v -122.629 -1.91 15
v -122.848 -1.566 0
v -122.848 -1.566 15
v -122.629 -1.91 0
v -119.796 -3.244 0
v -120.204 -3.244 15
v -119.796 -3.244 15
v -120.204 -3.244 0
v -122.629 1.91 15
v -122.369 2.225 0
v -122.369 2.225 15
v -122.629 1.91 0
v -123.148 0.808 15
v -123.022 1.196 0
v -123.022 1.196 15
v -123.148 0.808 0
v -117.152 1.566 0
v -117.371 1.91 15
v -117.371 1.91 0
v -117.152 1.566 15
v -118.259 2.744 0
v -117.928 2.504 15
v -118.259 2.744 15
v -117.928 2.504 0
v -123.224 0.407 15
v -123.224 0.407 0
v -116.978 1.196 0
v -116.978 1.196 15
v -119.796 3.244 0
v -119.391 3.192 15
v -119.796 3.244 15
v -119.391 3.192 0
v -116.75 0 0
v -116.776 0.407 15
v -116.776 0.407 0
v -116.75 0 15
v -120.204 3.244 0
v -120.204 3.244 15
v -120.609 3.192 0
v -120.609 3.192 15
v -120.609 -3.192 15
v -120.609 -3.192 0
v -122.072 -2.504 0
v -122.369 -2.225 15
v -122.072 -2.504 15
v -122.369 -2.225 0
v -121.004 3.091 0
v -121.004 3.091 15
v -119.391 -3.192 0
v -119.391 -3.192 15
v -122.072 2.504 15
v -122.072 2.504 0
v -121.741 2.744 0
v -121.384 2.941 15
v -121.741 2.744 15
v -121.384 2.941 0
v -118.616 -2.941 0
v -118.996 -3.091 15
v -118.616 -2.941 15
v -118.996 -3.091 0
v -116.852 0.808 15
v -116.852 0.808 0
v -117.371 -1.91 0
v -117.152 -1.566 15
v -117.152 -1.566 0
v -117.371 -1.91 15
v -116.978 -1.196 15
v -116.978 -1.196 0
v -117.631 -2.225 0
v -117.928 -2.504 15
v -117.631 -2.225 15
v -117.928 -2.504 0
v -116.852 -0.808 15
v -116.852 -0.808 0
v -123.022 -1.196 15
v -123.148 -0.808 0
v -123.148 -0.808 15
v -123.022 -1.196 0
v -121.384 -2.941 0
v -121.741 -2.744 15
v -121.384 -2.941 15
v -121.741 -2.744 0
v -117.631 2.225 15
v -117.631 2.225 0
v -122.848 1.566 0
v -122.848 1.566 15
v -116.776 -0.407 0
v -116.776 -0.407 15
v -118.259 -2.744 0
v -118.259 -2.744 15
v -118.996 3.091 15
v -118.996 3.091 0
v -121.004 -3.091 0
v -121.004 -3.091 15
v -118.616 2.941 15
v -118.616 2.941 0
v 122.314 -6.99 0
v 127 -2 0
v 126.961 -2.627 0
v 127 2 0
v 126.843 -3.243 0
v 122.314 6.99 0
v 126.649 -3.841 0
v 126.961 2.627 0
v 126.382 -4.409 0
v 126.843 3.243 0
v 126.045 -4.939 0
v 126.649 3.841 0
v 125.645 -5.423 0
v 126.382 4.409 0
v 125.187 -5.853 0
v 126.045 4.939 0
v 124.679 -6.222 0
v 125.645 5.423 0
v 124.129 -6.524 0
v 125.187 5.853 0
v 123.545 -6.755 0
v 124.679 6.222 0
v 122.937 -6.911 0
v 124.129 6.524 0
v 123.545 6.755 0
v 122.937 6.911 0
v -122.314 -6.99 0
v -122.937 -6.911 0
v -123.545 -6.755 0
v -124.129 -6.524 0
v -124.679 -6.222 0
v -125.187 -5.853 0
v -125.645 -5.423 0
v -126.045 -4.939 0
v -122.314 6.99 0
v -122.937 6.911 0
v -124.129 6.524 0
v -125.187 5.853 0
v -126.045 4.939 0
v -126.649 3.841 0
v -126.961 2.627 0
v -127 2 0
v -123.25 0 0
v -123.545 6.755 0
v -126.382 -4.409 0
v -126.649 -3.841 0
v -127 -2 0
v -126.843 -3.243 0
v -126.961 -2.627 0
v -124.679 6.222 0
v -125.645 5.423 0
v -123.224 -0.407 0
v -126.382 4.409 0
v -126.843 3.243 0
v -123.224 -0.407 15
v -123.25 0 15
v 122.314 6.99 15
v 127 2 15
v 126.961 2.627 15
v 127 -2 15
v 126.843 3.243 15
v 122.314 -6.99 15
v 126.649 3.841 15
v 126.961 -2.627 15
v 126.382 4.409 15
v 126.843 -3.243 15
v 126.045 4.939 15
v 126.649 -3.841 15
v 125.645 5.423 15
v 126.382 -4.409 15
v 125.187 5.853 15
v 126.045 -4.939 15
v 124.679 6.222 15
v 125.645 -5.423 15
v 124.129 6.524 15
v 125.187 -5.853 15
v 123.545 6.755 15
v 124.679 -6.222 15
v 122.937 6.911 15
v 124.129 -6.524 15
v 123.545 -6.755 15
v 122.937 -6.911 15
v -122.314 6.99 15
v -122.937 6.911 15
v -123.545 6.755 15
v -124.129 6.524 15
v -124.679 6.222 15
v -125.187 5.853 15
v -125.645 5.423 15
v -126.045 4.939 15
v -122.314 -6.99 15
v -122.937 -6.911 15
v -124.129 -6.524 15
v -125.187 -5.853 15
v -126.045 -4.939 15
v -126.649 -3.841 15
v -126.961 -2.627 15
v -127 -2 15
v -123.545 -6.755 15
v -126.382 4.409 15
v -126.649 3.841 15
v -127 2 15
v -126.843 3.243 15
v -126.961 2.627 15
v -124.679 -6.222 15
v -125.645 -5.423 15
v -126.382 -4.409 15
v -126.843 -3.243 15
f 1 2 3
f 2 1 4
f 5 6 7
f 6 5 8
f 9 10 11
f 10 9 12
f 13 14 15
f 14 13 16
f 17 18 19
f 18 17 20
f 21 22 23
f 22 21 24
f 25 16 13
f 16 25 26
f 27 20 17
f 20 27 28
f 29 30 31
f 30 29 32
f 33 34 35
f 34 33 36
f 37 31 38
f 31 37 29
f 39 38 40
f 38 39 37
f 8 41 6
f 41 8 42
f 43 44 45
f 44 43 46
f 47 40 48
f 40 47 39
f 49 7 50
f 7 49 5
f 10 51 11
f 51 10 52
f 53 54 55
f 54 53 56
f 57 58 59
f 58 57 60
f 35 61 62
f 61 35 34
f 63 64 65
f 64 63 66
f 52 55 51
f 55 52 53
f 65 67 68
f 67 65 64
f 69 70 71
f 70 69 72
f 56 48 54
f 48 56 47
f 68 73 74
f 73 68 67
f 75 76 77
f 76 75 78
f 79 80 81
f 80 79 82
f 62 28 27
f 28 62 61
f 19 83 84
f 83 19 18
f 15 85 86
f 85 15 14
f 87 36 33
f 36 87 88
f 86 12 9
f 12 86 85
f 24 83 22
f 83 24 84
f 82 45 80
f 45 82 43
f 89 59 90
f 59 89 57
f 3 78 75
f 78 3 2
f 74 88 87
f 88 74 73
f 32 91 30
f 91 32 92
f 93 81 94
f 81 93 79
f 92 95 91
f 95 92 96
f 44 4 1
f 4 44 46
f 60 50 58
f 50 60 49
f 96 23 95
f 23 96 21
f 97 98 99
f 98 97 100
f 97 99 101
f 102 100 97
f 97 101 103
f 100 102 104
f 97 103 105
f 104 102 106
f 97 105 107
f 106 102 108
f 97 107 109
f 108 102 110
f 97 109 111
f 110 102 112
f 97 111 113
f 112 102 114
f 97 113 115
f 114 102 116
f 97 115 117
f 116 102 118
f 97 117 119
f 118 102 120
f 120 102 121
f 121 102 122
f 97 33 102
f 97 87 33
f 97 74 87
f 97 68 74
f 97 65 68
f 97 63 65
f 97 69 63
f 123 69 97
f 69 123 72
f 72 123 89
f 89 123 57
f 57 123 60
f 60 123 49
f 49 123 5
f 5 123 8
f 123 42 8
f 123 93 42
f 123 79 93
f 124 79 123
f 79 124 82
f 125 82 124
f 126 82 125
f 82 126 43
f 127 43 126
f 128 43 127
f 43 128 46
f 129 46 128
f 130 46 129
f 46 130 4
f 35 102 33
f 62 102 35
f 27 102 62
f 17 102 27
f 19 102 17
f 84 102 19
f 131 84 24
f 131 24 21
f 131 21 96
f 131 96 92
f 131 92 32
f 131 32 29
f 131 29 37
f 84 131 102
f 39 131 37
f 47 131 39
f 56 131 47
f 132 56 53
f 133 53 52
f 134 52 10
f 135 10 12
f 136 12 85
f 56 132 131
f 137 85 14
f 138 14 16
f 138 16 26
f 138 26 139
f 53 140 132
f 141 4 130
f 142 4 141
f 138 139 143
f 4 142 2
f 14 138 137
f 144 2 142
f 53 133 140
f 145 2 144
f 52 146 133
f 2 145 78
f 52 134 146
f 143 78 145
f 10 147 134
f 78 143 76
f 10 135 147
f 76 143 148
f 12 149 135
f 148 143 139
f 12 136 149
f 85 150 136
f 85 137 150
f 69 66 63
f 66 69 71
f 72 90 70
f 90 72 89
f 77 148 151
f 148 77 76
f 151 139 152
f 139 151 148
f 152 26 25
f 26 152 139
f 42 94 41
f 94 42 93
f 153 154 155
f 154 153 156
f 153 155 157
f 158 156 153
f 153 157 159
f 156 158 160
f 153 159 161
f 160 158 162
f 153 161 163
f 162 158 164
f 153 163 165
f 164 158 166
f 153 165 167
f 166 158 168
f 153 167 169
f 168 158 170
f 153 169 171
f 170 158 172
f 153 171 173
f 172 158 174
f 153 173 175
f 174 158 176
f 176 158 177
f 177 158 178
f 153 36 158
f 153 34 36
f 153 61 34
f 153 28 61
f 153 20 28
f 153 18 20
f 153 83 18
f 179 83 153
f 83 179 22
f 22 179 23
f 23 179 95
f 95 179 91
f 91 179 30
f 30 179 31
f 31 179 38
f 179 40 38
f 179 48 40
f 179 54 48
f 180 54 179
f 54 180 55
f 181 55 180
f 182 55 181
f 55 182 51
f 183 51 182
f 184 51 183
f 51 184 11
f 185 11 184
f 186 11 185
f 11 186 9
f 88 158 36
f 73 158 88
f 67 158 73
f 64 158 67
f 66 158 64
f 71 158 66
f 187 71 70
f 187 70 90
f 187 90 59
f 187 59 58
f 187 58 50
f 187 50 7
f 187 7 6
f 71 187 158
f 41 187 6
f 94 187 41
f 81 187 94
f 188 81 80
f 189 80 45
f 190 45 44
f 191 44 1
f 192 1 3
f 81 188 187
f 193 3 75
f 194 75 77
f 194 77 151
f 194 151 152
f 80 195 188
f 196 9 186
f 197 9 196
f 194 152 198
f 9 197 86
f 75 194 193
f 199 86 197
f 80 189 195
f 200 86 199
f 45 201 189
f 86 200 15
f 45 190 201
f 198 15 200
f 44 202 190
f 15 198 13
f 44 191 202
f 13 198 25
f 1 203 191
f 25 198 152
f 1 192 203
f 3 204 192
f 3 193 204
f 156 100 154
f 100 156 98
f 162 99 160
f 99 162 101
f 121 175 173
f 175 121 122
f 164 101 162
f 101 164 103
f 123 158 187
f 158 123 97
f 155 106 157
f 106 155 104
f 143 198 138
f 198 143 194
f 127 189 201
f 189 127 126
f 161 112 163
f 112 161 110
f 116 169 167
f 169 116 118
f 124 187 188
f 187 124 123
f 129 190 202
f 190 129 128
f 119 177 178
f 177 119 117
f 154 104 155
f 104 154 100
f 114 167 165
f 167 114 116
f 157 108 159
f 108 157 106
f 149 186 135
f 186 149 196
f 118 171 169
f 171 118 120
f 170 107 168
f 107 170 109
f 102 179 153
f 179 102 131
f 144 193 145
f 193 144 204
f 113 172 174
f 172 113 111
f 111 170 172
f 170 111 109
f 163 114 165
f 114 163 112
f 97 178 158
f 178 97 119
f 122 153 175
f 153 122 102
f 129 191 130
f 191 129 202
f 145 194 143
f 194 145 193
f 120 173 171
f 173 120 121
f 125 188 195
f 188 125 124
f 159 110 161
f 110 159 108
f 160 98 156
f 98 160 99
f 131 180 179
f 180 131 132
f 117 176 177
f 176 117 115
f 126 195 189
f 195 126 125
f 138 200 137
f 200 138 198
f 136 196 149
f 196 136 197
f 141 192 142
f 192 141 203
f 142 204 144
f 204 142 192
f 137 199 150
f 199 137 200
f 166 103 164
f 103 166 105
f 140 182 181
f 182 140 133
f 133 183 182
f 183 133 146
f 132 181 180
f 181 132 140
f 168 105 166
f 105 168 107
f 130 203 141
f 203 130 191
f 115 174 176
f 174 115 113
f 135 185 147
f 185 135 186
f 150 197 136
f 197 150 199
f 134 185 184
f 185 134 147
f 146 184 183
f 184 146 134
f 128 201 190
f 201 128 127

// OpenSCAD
$fn = 50;


difference() {
	union() {
		hull() {
			translate(v = [-122.0000000000, 2.0000000000, 0]) {
				cylinder(h = 15, r = 5);
			}
			translate(v = [122.0000000000, 2.0000000000, 0]) {
				cylinder(h = 15, r = 5);
			}
			translate(v = [-122.0000000000, -2.0000000000, 0]) {
				cylinder(h = 15, r = 5);
			}
			translate(v = [122.0000000000, -2.0000000000, 0]) {
				cylinder(h = 15, r = 5);
			}
		}
	}
	union() {
		translate(v = [-120.0000000000, 0.0000000000, 0]) {
			cylinder(h = 15, r = 3.2500000000);
		}
		translate(v = [-120.0000000000, 0.0000000000, 0]) {
			cylinder(h = 15, r = 1.8000000000);
		}
		translate(v = [-120.0000000000, 0.0000000000, 0]) {
			cylinder(h = 15, r = 1.8000000000);
		}
		translate(v = [-120.0000000000, 0.0000000000, 0]) {
			cylinder(h = 15, r = 1.8000000000);
		}
	}
}
